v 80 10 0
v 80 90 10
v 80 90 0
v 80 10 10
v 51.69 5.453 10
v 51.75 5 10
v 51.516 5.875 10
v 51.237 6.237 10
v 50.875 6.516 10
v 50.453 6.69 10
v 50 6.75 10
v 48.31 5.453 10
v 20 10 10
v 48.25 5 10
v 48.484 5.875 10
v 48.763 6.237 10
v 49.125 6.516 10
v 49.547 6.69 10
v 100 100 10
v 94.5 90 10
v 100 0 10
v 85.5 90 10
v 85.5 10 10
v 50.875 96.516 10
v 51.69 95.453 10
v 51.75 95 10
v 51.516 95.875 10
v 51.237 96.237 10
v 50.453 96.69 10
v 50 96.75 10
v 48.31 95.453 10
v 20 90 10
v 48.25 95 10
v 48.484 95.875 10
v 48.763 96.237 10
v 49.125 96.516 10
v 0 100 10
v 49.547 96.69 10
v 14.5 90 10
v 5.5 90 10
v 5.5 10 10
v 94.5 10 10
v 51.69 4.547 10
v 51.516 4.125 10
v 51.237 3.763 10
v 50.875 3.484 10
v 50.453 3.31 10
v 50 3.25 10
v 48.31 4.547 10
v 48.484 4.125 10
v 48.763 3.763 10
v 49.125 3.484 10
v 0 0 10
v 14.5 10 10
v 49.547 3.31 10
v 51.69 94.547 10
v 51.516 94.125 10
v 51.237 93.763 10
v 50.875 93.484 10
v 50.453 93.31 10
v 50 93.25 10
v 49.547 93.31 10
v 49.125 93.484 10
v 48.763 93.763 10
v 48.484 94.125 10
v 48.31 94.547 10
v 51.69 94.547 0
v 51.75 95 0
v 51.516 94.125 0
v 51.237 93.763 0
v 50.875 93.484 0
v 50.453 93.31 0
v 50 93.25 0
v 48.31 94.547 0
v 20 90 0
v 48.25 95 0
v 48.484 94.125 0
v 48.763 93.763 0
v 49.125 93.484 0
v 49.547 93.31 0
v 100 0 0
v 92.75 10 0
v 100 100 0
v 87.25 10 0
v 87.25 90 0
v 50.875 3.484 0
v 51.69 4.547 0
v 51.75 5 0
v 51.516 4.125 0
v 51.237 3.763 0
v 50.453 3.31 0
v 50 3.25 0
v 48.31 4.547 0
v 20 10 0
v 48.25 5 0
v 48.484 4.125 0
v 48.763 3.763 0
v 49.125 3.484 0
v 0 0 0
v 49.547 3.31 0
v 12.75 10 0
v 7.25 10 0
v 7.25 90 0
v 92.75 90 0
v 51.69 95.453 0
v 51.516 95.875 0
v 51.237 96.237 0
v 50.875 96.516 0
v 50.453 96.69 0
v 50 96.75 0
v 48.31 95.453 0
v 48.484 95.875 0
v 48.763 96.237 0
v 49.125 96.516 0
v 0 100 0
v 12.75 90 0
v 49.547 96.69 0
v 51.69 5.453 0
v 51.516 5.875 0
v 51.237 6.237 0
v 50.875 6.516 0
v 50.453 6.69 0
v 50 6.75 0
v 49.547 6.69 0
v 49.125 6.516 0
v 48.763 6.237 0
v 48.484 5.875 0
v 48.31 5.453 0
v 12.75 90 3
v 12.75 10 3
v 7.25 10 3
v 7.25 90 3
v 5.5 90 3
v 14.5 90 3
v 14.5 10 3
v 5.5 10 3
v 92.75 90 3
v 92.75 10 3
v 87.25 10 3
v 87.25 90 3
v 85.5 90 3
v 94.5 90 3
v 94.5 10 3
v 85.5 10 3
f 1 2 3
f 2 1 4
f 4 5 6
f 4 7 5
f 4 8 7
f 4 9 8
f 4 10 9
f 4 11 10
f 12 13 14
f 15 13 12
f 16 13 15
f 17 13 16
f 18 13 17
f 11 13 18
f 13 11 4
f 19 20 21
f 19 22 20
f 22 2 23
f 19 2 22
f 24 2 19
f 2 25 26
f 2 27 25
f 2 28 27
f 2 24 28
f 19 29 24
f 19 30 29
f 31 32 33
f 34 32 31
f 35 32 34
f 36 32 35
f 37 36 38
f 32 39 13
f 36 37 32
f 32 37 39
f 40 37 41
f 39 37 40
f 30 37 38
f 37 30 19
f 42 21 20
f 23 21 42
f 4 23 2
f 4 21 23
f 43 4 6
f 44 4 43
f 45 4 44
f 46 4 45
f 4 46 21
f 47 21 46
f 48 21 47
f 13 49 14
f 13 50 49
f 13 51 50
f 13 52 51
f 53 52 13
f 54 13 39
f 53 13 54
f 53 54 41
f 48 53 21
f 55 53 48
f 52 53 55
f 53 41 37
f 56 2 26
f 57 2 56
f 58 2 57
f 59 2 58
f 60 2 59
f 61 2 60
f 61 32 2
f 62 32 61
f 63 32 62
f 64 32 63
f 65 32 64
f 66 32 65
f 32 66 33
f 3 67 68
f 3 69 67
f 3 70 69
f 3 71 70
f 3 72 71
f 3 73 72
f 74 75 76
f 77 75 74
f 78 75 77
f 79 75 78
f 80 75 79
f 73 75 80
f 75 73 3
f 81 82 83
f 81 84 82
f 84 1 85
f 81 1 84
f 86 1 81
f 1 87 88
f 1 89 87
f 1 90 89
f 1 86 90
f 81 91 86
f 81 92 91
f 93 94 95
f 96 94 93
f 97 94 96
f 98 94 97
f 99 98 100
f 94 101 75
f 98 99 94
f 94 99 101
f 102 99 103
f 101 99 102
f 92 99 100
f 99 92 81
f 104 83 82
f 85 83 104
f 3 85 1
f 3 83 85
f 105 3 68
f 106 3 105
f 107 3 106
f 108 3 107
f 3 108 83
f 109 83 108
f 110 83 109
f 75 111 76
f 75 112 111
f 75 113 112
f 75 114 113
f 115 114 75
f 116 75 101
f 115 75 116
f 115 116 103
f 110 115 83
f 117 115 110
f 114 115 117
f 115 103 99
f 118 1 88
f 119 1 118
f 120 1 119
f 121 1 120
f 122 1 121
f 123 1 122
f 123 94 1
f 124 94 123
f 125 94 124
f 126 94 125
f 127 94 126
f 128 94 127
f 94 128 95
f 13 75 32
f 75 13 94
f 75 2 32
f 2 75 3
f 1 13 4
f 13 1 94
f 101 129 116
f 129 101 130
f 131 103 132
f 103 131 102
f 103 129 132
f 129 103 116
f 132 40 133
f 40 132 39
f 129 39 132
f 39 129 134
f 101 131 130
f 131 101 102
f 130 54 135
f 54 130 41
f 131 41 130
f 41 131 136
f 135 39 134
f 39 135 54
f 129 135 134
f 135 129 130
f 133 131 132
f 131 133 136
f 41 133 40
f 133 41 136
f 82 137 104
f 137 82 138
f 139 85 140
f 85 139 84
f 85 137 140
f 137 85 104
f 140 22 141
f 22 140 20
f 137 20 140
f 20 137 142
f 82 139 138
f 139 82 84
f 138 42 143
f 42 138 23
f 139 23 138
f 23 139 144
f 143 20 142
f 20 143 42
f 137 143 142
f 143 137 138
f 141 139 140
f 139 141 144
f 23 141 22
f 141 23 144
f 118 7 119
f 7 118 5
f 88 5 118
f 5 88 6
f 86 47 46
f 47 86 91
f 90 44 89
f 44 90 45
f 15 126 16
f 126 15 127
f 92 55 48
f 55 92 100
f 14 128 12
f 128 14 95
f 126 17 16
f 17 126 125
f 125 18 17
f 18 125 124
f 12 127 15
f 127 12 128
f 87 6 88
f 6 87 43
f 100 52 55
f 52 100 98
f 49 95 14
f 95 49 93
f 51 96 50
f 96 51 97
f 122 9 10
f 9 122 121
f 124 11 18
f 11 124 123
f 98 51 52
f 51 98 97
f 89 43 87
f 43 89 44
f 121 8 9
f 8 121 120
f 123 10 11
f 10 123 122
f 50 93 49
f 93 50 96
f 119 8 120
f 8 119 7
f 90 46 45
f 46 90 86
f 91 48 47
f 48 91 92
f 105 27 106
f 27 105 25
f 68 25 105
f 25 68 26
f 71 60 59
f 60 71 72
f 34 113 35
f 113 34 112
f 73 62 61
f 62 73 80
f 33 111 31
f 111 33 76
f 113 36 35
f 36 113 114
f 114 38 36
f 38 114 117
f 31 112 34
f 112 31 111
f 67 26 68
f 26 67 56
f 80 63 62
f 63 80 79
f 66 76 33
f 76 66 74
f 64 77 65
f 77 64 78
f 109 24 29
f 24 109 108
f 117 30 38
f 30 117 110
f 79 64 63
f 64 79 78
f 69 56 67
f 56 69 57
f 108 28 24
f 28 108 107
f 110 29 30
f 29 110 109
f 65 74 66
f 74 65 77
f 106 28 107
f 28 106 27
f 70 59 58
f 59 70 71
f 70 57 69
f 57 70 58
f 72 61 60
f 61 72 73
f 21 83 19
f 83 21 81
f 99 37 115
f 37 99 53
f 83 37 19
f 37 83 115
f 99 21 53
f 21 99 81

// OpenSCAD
difference()
{
    union()
    {
        cube([100,100,10]);
    }
    union()
    {
        translate([20,10,0])
            cube([60,80,10]);
        
        translate([10-5.5/2,10,0])
            cube([5.5,80,10]);
        translate([10-9/2,10,3])
            cube([9,80,10]);
        
        translate([90-5.5/2,10,0])
            cube([5.5,80,10]);
        translate([90-9/2,10,3])
            cube([9,80,10]);
        
        
        translate([50,5,0])
            cylinder(d=3.5,h=10,$fn=24);
        translate([50,100-5,0])
            cylinder(d=3.5,h=10,$fn=24);
    }
}
